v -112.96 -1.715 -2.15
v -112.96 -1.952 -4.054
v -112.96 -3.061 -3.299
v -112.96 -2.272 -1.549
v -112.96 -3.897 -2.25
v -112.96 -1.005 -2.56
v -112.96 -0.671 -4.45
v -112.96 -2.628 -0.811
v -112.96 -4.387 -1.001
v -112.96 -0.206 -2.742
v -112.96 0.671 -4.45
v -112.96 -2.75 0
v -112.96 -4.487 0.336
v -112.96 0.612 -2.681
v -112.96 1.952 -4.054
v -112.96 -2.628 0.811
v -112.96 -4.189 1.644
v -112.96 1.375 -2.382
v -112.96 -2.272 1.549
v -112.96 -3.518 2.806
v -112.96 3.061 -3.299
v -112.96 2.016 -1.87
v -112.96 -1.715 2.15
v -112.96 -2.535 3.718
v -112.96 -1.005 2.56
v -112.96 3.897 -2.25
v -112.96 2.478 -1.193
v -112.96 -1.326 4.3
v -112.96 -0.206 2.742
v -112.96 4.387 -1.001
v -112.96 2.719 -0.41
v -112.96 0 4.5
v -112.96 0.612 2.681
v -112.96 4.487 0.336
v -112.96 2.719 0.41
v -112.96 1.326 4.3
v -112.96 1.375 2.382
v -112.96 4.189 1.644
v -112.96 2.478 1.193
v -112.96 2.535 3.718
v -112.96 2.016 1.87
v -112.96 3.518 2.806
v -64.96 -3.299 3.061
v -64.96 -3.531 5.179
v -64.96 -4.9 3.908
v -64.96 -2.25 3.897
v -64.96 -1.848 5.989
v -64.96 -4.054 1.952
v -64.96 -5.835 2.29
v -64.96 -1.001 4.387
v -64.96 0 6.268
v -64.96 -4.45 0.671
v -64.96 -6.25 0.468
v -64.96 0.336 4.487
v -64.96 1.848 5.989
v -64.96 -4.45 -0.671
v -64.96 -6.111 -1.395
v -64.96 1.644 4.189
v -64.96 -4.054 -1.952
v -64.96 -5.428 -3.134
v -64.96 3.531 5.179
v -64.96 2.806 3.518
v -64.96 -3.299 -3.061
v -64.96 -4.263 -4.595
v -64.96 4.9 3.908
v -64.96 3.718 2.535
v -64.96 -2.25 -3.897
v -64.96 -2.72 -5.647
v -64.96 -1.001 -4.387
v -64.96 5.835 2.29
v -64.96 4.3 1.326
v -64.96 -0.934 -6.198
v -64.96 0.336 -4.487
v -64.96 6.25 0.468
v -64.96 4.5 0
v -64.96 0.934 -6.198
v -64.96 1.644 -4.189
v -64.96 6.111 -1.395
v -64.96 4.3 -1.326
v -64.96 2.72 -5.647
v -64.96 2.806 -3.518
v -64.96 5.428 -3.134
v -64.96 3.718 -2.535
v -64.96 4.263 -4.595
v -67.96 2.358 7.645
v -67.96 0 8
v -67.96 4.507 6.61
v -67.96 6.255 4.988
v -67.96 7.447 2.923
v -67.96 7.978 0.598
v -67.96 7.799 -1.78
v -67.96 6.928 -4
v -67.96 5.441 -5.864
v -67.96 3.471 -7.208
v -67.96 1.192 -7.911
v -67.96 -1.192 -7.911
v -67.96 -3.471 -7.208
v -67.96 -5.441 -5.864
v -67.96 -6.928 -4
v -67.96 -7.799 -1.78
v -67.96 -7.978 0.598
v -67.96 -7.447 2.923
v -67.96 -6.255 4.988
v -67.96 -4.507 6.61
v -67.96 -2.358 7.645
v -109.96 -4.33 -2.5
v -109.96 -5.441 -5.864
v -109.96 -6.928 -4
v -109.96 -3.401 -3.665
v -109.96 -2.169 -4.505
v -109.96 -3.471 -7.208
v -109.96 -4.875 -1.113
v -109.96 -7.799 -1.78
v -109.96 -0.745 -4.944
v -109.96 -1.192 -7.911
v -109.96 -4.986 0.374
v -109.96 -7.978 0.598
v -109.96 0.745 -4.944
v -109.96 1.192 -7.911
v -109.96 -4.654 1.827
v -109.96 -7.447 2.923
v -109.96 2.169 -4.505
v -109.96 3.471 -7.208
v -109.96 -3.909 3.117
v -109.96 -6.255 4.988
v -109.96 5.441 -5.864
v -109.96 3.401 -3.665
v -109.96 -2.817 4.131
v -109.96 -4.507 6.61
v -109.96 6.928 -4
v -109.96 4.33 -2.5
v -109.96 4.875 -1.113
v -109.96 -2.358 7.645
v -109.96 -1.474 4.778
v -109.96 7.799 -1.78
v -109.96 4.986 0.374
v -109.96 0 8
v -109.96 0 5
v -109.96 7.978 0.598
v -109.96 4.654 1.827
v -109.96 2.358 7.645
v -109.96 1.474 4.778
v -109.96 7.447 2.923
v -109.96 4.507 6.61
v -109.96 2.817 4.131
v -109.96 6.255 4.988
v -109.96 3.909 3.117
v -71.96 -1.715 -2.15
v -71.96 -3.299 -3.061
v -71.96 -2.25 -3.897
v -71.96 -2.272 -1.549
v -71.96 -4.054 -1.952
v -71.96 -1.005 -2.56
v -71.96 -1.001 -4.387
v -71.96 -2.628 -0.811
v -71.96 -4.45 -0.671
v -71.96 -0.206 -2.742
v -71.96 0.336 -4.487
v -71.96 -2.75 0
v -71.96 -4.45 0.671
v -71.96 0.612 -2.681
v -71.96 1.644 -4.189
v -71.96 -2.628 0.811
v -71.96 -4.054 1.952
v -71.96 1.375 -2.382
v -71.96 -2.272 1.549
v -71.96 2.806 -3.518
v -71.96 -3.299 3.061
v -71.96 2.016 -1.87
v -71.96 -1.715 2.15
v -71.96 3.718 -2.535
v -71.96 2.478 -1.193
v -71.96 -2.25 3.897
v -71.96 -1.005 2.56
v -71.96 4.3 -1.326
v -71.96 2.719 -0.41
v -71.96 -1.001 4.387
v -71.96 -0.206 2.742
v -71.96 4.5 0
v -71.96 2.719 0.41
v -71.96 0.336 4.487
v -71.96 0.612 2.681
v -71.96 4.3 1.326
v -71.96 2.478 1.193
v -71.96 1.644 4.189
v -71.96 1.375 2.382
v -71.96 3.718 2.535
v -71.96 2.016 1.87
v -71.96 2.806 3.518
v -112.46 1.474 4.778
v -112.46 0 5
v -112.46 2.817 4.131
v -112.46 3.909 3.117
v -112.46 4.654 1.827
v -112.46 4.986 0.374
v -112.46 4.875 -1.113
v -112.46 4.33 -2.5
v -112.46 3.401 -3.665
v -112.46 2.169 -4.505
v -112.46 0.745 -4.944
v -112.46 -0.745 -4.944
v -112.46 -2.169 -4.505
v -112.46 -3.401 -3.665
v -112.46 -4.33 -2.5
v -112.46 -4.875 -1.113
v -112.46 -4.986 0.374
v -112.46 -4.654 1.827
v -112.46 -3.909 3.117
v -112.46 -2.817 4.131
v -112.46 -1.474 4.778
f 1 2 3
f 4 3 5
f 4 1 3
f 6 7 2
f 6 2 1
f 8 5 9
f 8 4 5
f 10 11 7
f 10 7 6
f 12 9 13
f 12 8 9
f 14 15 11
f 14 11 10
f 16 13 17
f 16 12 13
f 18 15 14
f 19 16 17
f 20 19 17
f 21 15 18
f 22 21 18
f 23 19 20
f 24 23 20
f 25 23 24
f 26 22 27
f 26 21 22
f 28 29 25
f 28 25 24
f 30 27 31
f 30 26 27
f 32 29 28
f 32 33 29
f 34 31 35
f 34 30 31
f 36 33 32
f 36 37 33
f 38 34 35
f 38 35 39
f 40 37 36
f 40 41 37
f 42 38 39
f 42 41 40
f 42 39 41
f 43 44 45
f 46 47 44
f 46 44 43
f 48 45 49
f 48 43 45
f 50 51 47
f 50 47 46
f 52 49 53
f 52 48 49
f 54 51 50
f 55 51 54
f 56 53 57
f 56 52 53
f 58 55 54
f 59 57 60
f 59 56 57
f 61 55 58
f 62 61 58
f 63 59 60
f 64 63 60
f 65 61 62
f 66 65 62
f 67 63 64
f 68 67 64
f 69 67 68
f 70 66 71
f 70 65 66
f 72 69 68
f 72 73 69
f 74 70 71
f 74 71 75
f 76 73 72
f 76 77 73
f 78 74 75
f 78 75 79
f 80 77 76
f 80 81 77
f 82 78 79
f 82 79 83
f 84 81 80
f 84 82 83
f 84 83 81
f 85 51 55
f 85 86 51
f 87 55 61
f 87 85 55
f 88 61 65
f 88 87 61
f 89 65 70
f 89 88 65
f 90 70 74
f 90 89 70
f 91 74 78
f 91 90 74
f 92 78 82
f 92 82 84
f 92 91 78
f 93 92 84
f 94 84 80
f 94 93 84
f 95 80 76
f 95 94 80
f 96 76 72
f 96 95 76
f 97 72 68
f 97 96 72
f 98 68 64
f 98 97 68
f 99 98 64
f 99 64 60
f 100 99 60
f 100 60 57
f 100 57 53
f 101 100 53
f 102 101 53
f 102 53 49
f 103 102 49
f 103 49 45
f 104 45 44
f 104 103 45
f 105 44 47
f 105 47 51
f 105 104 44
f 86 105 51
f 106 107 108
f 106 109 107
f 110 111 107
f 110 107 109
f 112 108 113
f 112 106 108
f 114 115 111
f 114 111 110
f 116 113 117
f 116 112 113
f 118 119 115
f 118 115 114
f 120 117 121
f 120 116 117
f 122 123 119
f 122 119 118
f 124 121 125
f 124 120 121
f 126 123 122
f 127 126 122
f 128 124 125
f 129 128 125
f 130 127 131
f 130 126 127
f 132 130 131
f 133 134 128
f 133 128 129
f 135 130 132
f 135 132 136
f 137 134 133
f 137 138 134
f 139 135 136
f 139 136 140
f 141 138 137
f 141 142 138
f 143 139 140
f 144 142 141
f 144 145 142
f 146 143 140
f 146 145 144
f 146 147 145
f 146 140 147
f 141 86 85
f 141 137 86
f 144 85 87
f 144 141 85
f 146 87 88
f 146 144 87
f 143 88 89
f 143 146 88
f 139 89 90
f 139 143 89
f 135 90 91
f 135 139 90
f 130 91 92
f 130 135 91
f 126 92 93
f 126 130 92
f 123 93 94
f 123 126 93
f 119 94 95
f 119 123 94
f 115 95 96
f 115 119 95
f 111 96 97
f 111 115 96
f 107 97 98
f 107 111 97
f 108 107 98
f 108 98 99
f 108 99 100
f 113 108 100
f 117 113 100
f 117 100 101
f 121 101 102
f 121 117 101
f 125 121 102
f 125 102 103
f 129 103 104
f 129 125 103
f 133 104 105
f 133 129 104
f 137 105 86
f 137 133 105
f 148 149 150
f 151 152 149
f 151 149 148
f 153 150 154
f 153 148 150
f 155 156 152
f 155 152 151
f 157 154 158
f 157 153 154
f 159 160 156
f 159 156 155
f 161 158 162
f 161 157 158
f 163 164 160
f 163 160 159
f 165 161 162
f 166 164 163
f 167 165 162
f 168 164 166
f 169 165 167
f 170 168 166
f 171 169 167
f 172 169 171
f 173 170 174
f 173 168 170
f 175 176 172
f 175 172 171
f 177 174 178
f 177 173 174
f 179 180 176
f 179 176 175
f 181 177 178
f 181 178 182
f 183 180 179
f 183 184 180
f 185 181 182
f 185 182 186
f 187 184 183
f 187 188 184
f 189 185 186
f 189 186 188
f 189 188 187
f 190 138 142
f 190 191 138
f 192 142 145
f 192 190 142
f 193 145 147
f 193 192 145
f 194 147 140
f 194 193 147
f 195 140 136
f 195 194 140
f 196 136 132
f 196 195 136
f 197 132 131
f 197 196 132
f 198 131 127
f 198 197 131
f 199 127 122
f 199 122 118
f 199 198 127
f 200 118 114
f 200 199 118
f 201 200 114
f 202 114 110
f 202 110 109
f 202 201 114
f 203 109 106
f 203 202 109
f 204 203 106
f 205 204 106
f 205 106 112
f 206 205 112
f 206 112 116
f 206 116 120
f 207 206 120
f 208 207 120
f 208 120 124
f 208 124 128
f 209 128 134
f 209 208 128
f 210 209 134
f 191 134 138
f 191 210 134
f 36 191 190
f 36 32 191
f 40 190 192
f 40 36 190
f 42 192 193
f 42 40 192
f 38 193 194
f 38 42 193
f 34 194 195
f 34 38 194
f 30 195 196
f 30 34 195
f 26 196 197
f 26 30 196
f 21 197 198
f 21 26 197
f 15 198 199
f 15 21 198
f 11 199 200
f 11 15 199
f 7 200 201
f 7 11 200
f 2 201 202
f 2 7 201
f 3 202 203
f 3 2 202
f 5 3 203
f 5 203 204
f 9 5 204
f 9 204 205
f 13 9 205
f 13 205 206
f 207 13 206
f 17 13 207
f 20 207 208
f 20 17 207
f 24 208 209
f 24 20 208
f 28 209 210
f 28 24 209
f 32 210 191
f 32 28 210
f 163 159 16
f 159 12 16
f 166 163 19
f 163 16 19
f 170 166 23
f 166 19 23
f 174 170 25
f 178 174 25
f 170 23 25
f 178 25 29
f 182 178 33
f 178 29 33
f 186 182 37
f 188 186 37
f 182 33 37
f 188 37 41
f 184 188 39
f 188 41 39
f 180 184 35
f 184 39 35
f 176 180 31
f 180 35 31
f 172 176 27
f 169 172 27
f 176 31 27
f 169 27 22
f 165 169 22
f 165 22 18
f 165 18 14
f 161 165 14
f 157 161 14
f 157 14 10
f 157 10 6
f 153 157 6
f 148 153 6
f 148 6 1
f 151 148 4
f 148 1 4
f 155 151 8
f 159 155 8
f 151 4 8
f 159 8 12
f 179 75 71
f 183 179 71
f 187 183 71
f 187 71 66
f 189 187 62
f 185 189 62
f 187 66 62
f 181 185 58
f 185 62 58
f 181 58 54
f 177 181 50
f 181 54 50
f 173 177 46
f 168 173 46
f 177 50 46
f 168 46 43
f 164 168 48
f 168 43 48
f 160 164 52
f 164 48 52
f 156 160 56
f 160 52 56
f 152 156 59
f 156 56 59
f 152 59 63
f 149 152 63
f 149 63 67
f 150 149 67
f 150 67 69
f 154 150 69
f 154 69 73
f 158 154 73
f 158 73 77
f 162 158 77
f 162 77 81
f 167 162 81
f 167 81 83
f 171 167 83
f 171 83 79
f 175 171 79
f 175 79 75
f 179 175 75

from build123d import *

# Parameters (mm, degrees)
F0_W           = 3
F0_H           = 4.5
F3_D           = 5.5
F3_CBORE_D     = 9
F3_CBORE_DEPTH = 7


with BuildPart() as f1:
    # F0 (on Front) → F1 (revolve)
    with BuildSketch(Plane.XZ):
        Polygon((-71.96031, 2.75), (-71.96031, 0), (-67.96031, 0), (-67.96031, 4.5), (-71.96031, 4.5), align=None)
        Polygon((-67.96031, 8), (-67.96031, 4.5), (-64.96031, 4.5), (-64.96031, 6.267949), align=None)
        with Locations((-66.46031, 2.25)):
            Rectangle(F0_W, F0_H)
        Polygon((-112.46031, 0), (-109.96031, 0), (-109.96031, 2.75), (-109.96031, 5), (-112.46031, 5), align=None)
        Polygon((-109.96031, 2.75), (-71.96031, 2.75), (-71.96031, 4.5), (-67.96031, 4.5), (-67.96031, 8), (-109.96031, 8), (-109.96031, 5), align=None)
        Polygon((-112.96031, 0), (-112.46031, 0), (-112.46031, 5), (-112.96031, 4.5), align=None)
        Polygon((-81.96031, 0), (-71.96031, 0), (-71.96031, 2.75), (-109.96031, 2.75), (-109.96031, 0), align=None)
    revolve(axis=Axis((-88.96031, 0, 0), (-1, 0, 0)))

    # F3 (through all)
    with Locations(Plane.YZ.offset(-64.96031)):
        with Locations((0, 0)):
            CounterBoreHole(F3_D / 2, F3_CBORE_D / 2, F3_CBORE_DEPTH)


solid = f1.part
